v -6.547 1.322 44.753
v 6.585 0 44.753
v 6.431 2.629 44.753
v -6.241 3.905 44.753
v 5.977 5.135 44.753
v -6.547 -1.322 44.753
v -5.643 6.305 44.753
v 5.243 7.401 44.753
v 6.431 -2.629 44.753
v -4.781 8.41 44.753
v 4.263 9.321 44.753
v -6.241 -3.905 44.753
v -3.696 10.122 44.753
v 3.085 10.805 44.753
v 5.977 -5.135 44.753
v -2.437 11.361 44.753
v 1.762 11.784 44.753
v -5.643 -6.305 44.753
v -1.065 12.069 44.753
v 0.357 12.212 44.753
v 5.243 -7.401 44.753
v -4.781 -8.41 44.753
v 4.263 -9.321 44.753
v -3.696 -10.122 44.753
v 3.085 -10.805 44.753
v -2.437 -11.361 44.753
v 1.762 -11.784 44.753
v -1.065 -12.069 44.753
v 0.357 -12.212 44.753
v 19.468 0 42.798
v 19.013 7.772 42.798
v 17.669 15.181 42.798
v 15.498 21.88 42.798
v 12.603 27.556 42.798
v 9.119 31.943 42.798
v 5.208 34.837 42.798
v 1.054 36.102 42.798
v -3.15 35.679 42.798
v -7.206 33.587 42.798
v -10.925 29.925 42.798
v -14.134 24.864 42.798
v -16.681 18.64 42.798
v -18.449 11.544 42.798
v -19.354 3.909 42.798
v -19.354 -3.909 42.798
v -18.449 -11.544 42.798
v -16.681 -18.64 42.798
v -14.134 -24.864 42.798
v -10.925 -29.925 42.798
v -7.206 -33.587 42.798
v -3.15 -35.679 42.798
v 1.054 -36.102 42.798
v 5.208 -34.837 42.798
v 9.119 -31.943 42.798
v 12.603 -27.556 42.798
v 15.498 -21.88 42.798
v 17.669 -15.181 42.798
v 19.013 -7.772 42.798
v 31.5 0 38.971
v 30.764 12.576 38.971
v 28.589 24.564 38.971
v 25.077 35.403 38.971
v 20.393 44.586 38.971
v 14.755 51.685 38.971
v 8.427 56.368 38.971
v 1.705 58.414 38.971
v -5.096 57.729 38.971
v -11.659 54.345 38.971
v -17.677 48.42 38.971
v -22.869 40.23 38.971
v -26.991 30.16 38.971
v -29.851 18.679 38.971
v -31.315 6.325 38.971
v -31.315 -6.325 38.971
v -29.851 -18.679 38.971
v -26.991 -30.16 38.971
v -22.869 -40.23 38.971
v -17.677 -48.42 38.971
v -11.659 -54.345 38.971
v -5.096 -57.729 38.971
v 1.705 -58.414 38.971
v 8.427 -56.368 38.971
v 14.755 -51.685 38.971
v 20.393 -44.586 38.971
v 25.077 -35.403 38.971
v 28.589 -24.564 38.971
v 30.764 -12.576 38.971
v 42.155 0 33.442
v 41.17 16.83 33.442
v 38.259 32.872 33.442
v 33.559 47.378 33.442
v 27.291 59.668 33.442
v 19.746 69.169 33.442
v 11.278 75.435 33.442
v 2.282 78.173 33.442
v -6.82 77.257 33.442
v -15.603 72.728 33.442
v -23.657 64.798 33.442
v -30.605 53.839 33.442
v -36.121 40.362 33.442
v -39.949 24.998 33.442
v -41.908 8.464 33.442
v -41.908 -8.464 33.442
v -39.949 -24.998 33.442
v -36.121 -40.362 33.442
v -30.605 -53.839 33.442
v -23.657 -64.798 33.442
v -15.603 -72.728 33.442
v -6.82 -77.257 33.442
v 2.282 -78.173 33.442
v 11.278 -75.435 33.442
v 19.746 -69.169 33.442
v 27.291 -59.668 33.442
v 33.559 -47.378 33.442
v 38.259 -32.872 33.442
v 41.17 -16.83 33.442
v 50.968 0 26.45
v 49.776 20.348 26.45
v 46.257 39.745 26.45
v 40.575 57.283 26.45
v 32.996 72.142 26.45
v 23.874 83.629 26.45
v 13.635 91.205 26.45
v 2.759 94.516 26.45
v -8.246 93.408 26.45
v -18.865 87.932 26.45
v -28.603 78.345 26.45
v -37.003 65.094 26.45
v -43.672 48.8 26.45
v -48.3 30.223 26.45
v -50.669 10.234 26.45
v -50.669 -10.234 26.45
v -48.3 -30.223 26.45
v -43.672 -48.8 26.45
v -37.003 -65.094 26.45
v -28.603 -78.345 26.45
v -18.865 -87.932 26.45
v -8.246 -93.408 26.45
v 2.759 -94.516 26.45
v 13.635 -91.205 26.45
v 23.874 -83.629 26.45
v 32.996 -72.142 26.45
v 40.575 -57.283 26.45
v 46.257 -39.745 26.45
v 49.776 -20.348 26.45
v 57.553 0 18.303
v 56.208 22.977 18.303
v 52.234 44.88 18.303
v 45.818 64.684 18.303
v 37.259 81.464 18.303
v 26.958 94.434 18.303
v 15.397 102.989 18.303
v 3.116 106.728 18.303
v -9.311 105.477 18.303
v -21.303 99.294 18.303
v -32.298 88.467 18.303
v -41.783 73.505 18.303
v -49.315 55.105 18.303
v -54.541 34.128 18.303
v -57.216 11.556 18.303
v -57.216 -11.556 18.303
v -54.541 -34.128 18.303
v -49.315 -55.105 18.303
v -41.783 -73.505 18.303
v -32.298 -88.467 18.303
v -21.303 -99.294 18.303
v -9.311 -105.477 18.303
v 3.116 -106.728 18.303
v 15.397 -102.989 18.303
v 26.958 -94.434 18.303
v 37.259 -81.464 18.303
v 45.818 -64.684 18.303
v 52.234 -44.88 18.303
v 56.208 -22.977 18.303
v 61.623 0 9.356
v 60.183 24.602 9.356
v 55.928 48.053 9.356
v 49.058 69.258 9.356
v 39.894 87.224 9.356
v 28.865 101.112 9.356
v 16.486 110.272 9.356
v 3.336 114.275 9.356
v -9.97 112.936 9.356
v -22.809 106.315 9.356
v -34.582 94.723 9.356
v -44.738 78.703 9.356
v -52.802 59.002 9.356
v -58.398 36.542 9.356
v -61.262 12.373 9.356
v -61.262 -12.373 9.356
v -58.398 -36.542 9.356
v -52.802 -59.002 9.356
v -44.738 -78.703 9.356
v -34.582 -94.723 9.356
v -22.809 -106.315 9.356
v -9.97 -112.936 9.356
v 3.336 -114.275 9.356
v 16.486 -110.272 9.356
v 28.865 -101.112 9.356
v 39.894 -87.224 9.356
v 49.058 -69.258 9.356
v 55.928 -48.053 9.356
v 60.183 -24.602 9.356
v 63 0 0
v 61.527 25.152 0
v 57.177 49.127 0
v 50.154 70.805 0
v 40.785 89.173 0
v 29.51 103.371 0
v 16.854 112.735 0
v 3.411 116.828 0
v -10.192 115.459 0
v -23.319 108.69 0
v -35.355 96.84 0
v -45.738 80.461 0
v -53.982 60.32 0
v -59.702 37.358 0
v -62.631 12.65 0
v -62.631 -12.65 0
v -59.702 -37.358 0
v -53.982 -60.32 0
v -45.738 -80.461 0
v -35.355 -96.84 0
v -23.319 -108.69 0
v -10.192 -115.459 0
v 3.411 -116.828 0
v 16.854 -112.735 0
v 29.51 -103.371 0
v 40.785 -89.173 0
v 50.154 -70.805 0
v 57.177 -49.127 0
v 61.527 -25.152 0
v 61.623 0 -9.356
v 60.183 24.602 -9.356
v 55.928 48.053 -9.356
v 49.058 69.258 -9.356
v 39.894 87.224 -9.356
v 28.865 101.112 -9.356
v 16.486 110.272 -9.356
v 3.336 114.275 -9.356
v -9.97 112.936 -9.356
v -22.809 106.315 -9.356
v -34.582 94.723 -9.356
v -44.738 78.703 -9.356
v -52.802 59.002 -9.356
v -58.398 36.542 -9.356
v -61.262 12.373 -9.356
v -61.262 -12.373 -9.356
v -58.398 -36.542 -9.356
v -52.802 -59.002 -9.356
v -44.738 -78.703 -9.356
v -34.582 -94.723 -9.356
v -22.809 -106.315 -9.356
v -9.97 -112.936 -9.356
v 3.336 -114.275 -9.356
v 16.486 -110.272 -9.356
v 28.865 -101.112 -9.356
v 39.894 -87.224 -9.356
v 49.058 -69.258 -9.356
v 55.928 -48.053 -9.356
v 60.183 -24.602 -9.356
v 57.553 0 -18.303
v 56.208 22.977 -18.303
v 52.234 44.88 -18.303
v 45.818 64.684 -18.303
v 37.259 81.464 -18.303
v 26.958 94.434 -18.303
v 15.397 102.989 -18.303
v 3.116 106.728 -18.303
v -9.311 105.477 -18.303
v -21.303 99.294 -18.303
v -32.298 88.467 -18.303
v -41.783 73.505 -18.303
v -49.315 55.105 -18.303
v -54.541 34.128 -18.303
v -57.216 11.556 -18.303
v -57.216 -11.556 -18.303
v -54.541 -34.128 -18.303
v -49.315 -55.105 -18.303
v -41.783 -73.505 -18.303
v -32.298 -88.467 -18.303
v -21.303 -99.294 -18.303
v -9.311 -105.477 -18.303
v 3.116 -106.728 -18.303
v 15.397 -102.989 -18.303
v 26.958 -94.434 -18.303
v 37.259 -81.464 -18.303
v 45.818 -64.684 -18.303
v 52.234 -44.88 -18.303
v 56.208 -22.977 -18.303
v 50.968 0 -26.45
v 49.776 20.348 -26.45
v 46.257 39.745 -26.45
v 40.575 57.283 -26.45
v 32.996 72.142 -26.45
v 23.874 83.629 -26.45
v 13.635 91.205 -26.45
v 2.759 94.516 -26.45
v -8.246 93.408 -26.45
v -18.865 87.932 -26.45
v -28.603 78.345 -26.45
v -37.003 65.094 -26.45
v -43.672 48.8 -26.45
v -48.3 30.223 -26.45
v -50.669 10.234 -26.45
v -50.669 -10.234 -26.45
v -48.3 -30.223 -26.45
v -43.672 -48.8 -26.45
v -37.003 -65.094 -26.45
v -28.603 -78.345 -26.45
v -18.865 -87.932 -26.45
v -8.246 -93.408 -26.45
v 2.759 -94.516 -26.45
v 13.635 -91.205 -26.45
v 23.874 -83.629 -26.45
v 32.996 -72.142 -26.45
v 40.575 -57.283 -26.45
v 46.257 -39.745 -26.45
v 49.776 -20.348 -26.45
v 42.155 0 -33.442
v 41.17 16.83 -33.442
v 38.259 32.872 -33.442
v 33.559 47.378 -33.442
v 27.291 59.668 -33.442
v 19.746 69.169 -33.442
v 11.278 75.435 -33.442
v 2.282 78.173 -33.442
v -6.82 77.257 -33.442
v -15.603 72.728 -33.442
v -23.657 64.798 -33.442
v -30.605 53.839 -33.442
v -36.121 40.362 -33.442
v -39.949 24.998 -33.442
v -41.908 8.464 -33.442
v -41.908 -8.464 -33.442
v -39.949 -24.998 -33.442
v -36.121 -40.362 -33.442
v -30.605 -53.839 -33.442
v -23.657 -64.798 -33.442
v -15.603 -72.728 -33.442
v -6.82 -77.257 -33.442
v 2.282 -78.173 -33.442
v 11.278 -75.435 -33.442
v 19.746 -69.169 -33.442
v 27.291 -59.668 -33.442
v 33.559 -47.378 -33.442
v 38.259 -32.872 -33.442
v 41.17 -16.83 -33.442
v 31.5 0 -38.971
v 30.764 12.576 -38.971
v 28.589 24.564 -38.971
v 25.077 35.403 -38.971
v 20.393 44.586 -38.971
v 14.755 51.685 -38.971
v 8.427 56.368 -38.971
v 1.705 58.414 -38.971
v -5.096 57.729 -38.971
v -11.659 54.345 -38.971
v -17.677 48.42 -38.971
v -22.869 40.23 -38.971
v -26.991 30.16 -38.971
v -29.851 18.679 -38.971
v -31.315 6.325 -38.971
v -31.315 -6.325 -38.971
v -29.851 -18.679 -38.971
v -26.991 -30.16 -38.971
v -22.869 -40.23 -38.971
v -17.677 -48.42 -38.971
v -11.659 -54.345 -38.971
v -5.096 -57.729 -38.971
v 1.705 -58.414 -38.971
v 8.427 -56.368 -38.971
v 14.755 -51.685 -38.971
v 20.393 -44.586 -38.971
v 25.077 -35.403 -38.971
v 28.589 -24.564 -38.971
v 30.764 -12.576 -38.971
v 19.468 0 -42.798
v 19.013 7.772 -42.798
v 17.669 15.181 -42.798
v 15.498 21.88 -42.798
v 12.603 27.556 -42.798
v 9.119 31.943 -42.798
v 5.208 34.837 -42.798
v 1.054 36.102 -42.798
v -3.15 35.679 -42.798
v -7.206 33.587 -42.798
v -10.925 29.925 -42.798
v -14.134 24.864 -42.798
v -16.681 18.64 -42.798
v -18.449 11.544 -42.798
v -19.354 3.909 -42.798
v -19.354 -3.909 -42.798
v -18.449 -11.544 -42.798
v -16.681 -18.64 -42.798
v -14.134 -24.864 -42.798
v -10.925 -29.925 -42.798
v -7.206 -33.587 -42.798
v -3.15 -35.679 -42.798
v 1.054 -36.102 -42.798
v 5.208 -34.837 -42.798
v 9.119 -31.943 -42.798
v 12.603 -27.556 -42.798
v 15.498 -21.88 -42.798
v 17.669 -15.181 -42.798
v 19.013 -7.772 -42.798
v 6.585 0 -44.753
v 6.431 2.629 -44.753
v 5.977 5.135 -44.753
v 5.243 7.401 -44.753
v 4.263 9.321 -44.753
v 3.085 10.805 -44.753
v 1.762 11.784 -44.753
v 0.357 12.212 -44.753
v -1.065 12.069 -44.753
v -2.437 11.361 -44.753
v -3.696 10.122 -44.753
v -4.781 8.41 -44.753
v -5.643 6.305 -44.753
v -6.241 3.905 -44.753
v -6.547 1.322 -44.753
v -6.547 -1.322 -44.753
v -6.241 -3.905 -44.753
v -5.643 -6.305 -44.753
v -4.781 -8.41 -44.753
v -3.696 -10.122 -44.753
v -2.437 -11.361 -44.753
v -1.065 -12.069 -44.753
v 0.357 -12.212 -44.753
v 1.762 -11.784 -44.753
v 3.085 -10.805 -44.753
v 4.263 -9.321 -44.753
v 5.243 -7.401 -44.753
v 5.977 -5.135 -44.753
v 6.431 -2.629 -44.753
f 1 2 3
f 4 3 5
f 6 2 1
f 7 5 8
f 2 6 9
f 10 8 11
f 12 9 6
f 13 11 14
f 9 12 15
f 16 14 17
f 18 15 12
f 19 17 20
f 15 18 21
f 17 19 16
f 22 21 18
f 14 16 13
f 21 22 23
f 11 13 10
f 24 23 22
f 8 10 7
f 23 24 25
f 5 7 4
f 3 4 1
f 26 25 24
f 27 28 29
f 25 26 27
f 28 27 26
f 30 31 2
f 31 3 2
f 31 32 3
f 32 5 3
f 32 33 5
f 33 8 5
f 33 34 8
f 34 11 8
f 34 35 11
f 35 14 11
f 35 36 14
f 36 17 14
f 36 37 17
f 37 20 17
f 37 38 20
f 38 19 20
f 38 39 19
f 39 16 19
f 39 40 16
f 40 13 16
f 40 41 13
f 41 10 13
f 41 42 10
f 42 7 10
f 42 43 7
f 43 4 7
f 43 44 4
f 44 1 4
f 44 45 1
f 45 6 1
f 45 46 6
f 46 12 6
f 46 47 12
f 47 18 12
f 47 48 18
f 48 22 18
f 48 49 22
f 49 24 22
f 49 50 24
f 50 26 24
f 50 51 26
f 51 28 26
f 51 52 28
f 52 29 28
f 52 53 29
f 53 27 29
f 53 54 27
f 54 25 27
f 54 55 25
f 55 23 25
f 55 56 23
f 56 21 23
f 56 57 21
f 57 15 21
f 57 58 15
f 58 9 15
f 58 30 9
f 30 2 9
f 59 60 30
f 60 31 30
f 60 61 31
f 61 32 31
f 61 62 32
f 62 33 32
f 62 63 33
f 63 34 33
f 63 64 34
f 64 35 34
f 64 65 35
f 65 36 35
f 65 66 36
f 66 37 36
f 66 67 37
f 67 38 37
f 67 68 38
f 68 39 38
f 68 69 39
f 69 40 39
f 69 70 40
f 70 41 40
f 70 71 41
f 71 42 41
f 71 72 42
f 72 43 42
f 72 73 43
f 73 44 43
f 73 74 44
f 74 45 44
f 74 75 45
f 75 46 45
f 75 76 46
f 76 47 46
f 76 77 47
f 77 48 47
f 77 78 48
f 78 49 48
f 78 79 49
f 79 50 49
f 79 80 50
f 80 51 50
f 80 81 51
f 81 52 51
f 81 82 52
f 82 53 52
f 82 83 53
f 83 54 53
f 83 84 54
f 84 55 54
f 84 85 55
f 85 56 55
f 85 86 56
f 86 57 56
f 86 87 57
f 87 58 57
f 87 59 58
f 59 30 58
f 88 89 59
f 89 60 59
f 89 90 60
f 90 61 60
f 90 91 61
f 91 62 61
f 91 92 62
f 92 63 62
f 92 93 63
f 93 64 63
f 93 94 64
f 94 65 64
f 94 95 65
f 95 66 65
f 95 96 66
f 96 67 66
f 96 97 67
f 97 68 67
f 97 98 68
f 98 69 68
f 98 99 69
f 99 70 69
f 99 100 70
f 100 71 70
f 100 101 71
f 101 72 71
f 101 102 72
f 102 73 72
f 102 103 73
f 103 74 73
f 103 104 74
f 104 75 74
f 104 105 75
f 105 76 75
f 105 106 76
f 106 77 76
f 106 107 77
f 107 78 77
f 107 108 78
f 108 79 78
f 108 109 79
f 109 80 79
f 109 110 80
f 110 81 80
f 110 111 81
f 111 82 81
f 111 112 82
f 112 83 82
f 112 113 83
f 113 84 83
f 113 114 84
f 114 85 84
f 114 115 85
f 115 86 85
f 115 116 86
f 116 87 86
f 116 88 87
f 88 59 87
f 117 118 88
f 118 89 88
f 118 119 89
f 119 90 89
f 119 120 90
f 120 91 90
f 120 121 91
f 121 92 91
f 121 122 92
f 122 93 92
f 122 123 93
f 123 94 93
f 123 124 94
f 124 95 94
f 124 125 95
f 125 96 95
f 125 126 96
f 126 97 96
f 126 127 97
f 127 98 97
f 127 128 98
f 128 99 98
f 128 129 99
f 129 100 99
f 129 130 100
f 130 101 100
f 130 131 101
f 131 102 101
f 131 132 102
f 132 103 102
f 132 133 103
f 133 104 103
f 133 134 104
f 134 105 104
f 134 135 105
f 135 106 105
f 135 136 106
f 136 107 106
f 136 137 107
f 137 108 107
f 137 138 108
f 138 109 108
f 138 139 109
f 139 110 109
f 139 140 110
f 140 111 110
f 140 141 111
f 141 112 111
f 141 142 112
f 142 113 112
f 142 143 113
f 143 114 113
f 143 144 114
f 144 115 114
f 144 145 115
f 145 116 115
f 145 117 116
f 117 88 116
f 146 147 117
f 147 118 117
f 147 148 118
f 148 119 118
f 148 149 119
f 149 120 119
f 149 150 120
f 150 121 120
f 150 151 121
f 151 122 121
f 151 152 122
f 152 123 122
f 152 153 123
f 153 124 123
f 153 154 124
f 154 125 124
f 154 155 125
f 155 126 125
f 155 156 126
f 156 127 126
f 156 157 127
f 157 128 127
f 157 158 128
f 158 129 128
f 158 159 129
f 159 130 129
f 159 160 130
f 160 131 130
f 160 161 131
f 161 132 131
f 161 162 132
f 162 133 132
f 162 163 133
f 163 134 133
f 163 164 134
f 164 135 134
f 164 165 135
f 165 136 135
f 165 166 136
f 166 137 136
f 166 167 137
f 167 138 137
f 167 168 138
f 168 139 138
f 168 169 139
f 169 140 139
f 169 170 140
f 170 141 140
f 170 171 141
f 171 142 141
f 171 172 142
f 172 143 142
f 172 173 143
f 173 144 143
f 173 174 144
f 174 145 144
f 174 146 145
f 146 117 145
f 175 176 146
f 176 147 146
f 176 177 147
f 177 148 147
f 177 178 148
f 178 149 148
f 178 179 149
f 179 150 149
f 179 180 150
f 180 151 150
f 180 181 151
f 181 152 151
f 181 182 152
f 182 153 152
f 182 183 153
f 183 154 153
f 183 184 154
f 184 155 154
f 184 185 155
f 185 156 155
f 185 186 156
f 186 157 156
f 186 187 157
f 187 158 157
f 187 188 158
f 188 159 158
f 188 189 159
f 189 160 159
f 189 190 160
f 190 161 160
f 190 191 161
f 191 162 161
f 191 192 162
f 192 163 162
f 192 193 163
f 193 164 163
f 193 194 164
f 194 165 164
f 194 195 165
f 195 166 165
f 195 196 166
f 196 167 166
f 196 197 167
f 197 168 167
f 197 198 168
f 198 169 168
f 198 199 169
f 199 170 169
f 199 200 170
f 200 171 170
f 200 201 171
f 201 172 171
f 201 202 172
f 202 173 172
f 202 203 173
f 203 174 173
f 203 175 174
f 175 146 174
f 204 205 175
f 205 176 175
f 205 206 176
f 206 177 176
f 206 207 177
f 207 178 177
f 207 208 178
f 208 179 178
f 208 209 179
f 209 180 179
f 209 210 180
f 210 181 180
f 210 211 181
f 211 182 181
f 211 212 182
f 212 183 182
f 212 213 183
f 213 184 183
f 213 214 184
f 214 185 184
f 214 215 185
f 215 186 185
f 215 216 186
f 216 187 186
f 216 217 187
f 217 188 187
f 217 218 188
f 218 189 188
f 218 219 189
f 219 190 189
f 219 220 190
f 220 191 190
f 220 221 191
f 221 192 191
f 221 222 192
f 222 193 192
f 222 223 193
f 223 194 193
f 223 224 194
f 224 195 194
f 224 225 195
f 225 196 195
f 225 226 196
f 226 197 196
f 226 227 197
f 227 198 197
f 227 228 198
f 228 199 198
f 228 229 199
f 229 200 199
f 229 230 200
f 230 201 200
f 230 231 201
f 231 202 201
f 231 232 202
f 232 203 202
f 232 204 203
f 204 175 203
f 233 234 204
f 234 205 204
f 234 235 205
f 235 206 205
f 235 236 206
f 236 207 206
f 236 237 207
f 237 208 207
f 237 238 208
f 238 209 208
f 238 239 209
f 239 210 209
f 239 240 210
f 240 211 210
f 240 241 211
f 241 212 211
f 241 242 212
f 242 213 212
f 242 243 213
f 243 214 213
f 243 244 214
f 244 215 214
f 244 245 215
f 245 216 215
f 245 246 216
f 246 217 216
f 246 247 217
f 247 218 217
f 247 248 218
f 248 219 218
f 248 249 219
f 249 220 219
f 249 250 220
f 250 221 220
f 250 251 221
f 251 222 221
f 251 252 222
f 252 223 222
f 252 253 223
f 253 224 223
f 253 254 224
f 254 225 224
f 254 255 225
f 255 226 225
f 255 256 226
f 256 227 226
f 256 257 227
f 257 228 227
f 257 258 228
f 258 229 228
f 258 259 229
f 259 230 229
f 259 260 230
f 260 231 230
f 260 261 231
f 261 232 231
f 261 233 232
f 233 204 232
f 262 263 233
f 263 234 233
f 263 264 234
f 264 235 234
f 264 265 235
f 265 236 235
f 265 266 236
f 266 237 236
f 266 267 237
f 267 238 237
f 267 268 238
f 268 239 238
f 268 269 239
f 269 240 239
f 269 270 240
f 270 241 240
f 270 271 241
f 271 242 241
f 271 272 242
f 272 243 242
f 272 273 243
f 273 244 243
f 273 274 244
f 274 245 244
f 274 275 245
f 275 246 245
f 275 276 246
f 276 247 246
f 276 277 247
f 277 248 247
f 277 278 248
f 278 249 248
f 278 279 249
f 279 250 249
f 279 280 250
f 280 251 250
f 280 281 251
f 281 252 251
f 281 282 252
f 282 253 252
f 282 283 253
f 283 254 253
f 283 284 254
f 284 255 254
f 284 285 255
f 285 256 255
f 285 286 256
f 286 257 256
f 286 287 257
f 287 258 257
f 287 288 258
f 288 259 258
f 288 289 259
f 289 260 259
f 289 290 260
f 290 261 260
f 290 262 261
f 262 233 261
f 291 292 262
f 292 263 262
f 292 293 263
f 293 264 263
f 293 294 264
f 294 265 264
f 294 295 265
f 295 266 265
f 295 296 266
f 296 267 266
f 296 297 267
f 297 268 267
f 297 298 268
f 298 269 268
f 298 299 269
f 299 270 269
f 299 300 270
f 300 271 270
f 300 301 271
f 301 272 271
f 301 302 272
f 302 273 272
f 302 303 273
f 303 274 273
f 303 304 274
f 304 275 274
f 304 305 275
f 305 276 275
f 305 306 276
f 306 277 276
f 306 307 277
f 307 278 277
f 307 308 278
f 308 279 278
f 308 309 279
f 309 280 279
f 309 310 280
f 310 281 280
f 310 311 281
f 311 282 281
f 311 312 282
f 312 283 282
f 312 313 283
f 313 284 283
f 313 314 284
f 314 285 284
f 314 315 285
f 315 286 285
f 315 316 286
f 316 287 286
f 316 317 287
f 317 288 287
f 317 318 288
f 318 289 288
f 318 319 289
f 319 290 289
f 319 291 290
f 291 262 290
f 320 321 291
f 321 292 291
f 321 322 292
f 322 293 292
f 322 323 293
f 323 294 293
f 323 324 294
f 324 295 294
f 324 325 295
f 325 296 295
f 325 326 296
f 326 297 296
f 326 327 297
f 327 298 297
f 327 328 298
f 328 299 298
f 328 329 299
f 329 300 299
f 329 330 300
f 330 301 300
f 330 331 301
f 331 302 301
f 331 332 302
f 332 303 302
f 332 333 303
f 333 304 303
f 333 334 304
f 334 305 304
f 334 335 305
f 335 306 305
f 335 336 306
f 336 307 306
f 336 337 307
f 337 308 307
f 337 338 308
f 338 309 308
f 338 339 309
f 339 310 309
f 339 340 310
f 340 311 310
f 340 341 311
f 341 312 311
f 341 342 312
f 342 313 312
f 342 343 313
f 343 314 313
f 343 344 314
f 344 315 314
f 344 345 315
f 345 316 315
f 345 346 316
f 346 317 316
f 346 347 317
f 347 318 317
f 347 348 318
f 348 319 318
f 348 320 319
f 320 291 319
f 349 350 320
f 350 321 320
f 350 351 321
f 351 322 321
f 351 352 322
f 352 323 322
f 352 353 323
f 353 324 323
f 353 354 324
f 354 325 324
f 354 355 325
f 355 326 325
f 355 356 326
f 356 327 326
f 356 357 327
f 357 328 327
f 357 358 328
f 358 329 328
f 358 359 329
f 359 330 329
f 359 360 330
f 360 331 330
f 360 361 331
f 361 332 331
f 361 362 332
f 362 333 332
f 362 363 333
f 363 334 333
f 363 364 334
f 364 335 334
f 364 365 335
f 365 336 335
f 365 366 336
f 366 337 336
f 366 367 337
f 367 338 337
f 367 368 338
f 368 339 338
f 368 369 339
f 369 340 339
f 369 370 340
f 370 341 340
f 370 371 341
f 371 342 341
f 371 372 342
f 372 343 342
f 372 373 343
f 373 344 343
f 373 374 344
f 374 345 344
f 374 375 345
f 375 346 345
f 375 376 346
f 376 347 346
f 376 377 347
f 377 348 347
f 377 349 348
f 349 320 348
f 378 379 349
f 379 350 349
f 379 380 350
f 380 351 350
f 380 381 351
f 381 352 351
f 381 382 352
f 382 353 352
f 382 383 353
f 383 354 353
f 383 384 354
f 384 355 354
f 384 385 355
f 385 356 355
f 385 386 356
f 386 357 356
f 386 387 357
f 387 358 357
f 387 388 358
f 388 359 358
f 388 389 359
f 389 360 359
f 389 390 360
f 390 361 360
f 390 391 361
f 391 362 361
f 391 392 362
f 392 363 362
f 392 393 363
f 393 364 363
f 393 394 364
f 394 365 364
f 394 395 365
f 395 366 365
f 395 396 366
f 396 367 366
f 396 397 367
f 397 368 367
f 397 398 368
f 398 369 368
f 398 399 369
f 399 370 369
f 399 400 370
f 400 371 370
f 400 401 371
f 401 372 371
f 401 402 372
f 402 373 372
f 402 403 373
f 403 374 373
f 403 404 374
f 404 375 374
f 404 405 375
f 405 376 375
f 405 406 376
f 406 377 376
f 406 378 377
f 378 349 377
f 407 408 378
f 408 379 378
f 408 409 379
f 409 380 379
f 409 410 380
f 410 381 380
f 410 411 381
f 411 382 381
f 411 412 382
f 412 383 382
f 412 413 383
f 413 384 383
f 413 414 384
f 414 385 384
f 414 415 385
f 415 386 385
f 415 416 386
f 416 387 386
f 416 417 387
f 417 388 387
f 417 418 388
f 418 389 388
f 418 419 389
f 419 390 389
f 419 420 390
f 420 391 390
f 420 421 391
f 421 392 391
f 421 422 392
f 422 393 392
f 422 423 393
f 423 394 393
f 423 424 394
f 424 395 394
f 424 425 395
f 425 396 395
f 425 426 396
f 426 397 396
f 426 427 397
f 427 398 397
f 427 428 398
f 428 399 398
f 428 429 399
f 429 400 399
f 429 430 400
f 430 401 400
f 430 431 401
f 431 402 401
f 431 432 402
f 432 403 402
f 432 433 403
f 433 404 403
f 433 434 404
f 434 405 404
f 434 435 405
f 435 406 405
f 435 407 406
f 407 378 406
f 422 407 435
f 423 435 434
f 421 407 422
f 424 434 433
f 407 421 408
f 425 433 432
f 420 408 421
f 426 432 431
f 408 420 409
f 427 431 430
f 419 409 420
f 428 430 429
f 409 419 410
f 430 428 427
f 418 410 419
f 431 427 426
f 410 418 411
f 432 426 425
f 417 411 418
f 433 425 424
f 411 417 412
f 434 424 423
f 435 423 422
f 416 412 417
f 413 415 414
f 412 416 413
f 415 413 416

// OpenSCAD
// Generated by SolidPython 1.0.1 on 2020-07-29 00:46:47


scale(v = [7, 13, 5]) {
	sphere(r = 9);
}
/***********************************************
*********      SolidPython code:      **********
************************************************
 
# import packages: SolidPython
from solid import *
from solid.utils import *
from itertools import chain, combinations, permutations


class Resize:

    def __init__(self, scad_file):
        self.scad_file = scad_file
        #self.scad_file = import_scad(scad_file)
        # cone/cylinder param:
        self.r1 = 0
        self.r2 = 0
        self.h = 0
        # rectangular prism param:
        self.w = 0
        self.l = 0
        # ellipse param:
        self.r = 0

    # import OpenScad code (file name corresponds to shape)


    # classify shape + parameters
    def assign(self, param1, param2, param3):
        if self.scad_file == 'cone.scad':
            self.r1 = param1
            self.r2 = param2
            self.h = param3
        elif self.scad_file == 'cylinder.scad':
            self.r1 = param1
            self.r2 = param2
            self.h = param3
        elif self.scad_file == 'rectangularPrism.scad':
            self.h = param1
            self.l = param2
            self.w = param3
        else:
            self.r = param1
            self.h = param2

    # resize parameters
    def iterate(self):
        x = range(3, 20, 2)
        i = 1
        if self.scad_file == 'cone.scad':
            tempList = list(permutations(x, 2))
            for temp in tempList:
                param1 = temp[0]
                param2 = temp[1]
                filepath = 'produced_scad_files/' + 'cone' + str(param1) + '_' + str(param2) + '_' + '.scad'
                scad_render_to_file(cylinder(h=param1, r1=param2, r2=0), filepath)

        elif self.scad_file == 'cylinder.scad':
            tempList = list(permutations(x, 3))
            for temp in tempList:
                param1 = temp[0]
                param2 = temp[1]
                filepath = 'produced_scad_files/' + 'cylinder' + str(param1) + '_' + str(param2) + '_' + '.scad'
                scad_render_to_file(cylinder(h=param1, r1=param2, r2=param2), filepath)

        elif self.scad_file == 'rectangularPrism.scad':
            tempList = list(permutations(x, 3))
            for temp in tempList:
                param1 = temp[0]
                param2 = temp[1]
                param3 = temp[2]
                filepath = 'produced_scad_files/' + 'rectangularPrism' + str(param1) + '_' + str(param2) + '_' + str(
                    param3) + '.scad'
                scad_render_to_file(cube(size=(param1, param2, param3)), filepath)

        elif self.scad_file == 'ellipse.scad':
            tempList = list(permutations(x, 4))
            for temp in tempList:
                param1 = temp[0]
                param2 = temp[1]
                param3 = temp[2]
                param4 = temp[3]
                filepath = 'produced_scad_files/' + 'ellipse' + str(param1) + '_' + str(param2) + '_' + str(param3) + '_' + str(param4) + '.scad'
                scad_render_to_file(scale([param1, param2, param3])(sphere(r=param4)), filepath)

    def render_to_scadfile(self):
        scad_render_to_file(scad, 'example.scad') 
 
************************************************/
